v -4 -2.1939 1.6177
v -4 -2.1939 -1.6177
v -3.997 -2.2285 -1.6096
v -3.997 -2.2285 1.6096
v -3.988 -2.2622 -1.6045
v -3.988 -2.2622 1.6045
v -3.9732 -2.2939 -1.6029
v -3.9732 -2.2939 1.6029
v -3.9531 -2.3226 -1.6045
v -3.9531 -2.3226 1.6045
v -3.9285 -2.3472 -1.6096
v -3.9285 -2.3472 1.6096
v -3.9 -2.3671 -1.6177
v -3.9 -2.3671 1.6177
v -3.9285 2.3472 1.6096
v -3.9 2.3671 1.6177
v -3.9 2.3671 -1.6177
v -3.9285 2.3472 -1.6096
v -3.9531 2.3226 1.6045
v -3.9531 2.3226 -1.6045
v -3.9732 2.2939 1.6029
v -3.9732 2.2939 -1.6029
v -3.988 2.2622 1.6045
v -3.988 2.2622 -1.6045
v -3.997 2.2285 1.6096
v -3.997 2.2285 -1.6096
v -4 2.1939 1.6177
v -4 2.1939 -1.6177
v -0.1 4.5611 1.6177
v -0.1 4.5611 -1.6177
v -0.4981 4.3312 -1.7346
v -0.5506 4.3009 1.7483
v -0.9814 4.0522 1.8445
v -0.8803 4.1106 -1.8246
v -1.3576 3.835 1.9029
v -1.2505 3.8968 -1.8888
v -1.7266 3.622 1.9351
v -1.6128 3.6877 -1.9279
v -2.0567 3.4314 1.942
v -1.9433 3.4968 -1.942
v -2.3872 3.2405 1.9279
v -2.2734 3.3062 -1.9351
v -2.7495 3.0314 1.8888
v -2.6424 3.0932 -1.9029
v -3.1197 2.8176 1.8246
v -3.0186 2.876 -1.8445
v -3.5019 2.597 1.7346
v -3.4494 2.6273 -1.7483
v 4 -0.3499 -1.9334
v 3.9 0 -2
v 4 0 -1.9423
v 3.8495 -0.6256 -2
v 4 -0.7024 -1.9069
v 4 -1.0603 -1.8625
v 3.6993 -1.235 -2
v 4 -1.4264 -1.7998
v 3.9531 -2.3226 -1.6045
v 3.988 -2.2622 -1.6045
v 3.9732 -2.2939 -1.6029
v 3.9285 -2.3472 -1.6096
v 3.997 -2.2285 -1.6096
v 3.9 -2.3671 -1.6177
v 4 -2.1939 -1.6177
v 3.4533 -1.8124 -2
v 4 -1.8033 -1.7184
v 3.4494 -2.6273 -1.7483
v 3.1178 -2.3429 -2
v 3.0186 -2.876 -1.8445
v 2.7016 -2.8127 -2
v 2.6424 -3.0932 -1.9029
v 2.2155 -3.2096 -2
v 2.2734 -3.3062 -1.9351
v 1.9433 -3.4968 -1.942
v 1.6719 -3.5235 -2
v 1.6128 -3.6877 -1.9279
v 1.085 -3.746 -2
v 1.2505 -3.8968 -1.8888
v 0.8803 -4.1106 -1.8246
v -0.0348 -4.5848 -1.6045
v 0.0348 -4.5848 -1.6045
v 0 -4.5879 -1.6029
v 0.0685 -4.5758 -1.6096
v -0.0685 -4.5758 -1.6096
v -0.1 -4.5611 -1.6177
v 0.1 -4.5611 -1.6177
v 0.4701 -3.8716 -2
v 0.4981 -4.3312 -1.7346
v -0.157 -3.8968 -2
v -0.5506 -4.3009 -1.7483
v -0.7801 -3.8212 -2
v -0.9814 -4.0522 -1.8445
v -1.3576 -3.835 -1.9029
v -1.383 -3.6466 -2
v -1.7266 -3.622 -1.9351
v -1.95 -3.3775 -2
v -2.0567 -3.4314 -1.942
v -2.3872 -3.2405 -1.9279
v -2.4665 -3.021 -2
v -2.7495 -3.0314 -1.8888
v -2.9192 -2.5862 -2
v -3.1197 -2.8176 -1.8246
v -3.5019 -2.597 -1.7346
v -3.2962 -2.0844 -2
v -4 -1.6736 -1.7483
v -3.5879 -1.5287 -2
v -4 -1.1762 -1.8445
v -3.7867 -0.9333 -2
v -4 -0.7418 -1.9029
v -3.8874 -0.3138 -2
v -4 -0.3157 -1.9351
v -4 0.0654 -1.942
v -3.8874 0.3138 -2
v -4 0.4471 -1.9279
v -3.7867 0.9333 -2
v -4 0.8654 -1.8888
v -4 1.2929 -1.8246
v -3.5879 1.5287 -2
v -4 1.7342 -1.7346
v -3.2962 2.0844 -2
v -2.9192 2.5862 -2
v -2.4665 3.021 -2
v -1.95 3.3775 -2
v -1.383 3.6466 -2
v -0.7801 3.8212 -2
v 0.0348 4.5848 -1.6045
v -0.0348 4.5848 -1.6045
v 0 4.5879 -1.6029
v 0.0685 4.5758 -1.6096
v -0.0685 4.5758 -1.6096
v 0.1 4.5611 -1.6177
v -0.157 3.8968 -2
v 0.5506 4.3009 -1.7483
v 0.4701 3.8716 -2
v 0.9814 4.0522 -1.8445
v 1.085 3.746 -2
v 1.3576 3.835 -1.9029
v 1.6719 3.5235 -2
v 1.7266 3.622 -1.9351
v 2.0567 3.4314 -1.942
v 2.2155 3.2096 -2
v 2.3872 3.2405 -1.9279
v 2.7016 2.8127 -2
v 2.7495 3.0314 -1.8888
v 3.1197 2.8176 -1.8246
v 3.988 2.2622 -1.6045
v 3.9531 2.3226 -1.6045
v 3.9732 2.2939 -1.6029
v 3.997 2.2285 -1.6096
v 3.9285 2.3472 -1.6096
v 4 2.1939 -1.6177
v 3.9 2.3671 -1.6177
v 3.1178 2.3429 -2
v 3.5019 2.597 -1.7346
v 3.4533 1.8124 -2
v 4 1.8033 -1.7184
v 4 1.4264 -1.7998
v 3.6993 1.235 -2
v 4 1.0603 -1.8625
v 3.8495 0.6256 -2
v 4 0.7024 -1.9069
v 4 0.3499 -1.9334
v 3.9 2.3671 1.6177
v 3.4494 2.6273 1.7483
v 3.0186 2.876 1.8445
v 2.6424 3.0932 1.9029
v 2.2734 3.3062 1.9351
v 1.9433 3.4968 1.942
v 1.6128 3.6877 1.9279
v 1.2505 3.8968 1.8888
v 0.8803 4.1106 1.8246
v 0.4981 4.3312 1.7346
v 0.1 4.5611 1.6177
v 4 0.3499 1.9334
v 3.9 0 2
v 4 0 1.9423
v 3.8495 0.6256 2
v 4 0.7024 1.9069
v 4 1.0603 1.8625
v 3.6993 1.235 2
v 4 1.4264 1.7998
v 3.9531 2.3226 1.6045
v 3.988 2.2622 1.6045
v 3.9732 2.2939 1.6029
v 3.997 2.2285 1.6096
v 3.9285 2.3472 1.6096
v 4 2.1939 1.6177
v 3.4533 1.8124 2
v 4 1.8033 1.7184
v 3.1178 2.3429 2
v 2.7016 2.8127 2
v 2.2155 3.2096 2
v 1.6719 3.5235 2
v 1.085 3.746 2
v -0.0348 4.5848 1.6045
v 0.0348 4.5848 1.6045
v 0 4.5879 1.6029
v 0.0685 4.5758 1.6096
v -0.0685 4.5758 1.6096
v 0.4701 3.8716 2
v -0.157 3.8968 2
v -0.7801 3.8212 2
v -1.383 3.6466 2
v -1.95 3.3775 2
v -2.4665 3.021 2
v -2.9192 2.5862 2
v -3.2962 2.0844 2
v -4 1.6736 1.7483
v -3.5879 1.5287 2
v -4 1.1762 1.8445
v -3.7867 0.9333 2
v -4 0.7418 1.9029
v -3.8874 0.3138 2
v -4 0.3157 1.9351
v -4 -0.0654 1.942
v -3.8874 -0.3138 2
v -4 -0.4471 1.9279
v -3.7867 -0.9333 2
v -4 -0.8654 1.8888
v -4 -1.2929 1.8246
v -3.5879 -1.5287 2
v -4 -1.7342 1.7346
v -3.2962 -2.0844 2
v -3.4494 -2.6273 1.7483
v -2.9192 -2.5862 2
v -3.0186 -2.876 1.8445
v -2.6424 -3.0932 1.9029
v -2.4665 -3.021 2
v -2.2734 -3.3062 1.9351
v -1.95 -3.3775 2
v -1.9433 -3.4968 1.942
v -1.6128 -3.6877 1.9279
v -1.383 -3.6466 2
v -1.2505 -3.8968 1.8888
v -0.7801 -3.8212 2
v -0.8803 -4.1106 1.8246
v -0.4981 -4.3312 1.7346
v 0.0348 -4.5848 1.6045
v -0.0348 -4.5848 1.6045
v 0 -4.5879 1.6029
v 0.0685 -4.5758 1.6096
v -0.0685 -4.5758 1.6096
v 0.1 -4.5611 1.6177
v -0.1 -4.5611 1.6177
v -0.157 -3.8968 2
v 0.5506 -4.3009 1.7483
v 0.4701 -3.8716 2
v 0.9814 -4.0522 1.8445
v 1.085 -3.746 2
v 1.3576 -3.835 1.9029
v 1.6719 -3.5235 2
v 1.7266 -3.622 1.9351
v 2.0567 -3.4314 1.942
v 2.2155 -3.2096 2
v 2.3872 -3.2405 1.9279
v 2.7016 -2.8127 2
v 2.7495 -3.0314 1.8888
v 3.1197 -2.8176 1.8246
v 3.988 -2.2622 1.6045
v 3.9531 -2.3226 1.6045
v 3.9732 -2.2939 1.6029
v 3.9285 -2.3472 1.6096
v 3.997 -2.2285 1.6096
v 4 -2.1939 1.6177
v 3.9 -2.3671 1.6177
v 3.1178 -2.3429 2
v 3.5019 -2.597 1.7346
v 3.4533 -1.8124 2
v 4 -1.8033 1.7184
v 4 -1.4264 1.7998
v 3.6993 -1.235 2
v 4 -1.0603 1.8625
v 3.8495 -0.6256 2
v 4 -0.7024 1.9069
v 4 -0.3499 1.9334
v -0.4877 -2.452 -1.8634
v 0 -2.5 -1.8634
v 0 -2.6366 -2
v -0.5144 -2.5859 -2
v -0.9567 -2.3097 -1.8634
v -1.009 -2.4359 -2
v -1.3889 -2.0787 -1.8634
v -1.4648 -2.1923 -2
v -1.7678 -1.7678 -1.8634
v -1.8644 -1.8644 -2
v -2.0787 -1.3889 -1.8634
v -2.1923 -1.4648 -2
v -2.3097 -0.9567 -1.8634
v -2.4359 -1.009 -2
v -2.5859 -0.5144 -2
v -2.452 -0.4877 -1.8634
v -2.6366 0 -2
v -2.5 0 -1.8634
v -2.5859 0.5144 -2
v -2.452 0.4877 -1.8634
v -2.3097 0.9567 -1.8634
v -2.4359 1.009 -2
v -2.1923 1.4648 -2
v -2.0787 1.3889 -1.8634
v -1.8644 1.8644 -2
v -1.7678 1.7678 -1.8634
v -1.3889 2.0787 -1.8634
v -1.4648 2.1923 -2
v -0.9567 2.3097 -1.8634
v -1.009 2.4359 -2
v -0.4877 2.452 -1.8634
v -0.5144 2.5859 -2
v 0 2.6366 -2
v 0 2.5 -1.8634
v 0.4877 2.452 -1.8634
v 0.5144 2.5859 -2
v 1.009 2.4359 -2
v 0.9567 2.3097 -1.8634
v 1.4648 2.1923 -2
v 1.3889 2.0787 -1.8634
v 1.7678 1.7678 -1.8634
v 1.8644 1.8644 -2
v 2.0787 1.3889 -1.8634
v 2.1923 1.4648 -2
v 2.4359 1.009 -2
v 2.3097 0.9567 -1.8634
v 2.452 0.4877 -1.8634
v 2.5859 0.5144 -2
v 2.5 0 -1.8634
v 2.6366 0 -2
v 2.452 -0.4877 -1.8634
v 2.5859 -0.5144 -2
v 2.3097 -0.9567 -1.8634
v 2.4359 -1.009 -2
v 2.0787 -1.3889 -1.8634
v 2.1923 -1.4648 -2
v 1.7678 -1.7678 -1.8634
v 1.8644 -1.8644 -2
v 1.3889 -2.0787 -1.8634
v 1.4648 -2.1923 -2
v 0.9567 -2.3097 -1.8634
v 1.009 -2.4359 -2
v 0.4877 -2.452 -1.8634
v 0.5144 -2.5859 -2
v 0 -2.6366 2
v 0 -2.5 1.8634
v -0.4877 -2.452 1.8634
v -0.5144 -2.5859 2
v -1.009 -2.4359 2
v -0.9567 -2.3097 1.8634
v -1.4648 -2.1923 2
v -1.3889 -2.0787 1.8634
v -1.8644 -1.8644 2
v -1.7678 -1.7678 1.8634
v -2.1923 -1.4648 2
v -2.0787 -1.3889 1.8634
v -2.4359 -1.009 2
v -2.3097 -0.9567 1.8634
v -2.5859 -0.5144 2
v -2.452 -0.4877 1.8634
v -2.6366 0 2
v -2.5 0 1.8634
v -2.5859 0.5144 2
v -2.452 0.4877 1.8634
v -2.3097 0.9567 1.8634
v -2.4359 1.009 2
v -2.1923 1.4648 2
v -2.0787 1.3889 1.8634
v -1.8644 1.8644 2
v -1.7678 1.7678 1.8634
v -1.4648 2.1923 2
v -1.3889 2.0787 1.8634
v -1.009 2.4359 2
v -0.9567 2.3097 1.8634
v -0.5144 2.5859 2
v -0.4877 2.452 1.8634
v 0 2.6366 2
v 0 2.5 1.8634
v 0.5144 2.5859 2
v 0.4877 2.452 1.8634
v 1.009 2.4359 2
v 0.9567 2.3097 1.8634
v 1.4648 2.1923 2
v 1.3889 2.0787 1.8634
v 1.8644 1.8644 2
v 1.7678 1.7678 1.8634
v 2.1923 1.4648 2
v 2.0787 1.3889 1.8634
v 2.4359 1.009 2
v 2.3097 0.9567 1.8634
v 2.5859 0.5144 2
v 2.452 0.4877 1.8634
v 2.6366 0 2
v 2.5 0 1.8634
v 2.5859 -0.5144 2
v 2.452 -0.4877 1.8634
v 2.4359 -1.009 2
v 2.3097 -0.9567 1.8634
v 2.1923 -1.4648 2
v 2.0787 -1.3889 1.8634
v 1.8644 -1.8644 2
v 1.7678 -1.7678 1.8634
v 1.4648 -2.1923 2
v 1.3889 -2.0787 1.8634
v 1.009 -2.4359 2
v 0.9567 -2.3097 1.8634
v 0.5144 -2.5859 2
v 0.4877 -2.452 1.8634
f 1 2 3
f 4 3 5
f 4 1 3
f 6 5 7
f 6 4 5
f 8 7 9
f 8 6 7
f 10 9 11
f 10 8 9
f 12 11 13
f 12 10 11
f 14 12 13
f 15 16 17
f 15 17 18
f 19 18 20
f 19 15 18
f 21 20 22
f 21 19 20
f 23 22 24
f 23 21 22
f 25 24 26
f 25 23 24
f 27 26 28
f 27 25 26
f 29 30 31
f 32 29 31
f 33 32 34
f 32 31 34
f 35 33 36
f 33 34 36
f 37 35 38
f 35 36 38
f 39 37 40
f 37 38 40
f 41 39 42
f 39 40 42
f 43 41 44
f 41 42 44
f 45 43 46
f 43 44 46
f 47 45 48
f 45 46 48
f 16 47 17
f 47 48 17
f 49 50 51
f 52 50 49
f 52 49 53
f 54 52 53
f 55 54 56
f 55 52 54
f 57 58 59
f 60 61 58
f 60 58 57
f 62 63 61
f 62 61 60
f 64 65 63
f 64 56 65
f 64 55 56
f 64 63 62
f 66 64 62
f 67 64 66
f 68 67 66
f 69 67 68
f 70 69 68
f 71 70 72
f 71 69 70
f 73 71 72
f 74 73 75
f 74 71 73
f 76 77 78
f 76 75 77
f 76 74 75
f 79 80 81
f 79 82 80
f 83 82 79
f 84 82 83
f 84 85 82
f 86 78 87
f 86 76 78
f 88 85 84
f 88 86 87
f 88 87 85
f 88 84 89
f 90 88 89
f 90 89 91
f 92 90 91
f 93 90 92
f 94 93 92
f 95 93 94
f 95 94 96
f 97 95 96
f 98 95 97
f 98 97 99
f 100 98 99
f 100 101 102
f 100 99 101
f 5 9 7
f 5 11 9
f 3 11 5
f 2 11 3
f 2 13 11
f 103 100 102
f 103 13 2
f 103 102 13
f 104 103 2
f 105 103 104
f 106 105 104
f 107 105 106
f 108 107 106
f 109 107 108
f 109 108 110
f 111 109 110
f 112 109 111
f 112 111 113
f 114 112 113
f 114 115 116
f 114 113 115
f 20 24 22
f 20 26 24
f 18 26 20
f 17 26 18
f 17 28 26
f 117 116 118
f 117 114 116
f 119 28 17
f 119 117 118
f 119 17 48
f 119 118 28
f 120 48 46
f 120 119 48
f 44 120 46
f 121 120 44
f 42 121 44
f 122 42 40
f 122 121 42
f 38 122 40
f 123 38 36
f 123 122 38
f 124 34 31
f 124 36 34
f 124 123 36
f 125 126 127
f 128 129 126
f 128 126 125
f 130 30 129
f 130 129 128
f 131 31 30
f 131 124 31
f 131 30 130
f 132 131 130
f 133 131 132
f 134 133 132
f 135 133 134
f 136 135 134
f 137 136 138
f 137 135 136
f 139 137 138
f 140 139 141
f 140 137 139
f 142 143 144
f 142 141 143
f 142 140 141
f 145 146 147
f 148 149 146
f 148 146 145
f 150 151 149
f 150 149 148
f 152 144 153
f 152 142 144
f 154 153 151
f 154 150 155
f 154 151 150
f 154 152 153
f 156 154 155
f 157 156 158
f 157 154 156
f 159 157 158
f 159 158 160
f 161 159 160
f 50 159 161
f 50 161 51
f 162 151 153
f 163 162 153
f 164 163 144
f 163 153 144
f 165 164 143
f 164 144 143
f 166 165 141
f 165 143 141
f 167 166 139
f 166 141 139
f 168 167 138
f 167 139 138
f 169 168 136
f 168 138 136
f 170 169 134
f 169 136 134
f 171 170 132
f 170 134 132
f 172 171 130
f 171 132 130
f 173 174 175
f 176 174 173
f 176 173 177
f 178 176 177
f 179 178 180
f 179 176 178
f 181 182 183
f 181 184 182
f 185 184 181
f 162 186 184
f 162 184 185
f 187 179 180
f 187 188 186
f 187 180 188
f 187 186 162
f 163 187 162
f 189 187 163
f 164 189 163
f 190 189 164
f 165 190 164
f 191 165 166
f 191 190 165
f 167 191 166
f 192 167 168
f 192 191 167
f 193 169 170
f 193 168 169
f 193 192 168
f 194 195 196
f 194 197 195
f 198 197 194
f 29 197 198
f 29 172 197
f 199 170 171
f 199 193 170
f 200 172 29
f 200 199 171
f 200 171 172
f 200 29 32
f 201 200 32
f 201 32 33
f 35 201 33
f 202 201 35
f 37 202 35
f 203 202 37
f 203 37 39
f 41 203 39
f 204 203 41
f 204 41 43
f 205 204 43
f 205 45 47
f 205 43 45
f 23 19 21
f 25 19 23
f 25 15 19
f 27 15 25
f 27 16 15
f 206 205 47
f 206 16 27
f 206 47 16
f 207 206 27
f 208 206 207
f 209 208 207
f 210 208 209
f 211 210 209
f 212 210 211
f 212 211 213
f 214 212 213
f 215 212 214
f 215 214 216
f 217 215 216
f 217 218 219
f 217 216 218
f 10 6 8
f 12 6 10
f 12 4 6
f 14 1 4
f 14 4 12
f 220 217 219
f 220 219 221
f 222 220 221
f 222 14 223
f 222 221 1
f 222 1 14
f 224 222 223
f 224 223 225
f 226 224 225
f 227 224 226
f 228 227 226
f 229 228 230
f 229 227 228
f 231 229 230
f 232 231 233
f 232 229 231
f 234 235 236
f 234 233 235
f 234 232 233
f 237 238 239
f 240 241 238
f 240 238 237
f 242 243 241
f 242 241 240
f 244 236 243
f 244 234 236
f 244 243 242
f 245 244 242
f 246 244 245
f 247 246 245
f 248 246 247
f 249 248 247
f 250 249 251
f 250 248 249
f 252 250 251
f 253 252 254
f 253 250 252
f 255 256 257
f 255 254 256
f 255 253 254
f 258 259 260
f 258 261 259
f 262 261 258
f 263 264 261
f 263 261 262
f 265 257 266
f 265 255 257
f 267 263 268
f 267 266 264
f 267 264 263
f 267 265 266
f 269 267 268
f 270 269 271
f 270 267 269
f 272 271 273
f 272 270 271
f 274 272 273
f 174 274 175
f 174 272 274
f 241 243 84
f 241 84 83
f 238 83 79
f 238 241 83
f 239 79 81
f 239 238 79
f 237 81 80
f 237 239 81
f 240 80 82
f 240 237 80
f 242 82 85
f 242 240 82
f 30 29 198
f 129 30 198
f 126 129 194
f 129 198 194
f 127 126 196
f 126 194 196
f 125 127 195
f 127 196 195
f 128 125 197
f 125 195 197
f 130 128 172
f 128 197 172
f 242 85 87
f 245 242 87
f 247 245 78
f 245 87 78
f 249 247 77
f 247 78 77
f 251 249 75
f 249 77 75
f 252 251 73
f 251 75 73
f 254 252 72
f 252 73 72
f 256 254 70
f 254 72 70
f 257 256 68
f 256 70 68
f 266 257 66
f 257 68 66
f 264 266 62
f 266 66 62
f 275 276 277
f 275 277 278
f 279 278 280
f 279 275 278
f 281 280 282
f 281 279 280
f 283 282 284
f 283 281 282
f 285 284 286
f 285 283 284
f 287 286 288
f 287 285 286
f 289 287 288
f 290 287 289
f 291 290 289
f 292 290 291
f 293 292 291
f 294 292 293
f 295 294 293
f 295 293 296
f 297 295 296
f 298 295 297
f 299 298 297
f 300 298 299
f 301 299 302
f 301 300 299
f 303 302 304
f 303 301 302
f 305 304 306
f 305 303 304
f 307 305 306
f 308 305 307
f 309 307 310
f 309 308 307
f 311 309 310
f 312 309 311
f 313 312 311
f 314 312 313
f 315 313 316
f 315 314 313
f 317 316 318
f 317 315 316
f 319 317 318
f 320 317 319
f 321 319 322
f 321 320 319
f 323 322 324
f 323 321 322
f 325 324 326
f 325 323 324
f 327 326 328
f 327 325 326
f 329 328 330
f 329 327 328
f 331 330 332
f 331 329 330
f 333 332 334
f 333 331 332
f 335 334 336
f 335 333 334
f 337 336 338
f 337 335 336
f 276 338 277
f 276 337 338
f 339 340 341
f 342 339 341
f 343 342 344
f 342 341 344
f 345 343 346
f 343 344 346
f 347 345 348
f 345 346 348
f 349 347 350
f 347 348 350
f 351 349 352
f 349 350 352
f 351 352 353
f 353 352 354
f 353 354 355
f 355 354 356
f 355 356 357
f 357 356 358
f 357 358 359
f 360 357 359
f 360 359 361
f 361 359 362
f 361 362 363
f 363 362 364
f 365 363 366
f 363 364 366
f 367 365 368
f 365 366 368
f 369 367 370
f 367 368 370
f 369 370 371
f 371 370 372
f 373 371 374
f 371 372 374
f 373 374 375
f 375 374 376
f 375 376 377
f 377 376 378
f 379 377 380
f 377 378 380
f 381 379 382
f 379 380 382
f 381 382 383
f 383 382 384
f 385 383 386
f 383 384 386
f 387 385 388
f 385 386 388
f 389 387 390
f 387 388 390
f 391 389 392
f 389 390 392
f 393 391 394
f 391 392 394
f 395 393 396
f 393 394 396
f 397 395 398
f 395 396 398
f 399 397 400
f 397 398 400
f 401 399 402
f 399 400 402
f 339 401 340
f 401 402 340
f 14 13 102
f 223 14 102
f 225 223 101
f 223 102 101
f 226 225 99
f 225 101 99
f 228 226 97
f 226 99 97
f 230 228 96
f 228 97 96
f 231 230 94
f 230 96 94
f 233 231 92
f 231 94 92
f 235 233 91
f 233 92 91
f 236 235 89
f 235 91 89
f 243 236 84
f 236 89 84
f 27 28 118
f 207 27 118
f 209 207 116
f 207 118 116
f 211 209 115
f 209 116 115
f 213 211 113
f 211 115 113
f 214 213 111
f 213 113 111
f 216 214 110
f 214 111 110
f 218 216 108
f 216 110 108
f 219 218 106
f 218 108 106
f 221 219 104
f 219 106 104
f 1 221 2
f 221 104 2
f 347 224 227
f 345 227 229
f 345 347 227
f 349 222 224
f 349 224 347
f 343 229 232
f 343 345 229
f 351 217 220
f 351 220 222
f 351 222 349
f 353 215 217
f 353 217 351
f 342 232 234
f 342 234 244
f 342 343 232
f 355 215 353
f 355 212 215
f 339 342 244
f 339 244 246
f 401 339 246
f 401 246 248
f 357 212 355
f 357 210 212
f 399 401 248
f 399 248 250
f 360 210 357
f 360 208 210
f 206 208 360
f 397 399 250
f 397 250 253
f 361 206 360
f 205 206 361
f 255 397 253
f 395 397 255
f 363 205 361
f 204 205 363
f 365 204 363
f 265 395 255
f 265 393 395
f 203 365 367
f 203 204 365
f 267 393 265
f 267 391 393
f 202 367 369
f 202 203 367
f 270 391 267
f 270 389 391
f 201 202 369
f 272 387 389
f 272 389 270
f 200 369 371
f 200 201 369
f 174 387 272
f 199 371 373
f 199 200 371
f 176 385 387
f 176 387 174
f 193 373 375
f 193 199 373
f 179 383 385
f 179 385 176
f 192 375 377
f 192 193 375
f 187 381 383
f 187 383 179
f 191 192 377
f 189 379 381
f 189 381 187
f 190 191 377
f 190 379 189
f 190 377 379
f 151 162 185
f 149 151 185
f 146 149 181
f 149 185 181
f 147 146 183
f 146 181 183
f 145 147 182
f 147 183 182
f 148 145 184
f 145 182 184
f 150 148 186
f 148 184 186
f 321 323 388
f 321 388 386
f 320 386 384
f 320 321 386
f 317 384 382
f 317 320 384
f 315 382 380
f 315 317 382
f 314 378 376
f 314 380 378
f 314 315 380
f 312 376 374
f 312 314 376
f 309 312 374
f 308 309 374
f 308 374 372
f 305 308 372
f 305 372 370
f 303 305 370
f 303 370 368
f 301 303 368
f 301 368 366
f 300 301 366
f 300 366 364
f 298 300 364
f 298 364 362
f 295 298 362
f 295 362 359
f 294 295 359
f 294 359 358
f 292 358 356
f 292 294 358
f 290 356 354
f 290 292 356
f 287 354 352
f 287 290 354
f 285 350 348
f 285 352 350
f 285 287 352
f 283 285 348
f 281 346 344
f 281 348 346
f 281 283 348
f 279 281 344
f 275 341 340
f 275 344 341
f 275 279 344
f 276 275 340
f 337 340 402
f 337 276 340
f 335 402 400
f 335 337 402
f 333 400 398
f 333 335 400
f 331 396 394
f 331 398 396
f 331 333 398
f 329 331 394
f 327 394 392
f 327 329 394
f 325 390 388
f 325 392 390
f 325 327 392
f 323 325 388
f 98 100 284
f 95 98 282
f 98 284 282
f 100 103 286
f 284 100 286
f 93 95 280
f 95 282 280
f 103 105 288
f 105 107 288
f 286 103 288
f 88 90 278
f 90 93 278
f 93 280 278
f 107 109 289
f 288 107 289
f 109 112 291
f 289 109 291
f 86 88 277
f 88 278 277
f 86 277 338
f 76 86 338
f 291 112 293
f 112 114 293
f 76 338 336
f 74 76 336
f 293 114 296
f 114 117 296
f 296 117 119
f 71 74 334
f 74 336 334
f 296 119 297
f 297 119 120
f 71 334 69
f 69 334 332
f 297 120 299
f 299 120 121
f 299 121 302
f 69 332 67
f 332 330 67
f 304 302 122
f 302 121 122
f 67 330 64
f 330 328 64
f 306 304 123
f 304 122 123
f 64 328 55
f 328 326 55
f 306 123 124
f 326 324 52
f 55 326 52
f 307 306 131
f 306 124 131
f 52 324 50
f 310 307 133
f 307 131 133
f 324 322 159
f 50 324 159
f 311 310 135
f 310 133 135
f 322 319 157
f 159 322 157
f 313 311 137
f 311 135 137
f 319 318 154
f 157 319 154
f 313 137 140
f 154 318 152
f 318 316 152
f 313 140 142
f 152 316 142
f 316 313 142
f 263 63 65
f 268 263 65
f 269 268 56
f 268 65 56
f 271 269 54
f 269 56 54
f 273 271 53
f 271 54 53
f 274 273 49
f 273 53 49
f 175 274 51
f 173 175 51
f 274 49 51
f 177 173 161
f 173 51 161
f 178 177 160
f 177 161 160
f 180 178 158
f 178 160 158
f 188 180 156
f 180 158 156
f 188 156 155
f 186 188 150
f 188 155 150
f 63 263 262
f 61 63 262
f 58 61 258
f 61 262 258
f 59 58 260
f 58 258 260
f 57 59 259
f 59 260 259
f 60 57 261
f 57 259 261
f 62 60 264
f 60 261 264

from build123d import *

# Parameters (mm, degrees)
BOSS_EXTRUDE1_DEPTH      = 2
BOSS_EXTRUDE1_DEPTH_BACK = 2
SKETCH2_R                = 2.5
SKETCH3_OUTSIDE_W        = 41.334
SKETCH3_OUTSIDE_H        = 42.572
SKETCH3_OUTSIDE_R        = 3.9
CUT_EXTRUDE1_DEPTH       = 8.302967433
CUT_EXTRUDE1_DRAFT       = -60
FILLET1_R                = 0.2
MIRROR1_COPY_1_SKETCH_W  = 41.334
MIRROR1_COPY_1_SKETCH_H  = 42.572
MIRROR1_COPY_1_SKETCH_R  = 3.9
MIRROR1_COPY_1_DEPTH     = 8.302967433
MIRROR1_COPY_1_DRAFT     = -60


with BuildPart() as part:
    # Sketch2 → Boss-Extrude1 (new, two sides: drawn at the far end of the back side and taken through both)
    with BuildSketch(Plane.XY.offset(-BOSS_EXTRUDE1_DEPTH_BACK)):
        Polygon((0, 4.618802154), (-4, 2.309401077), (-4, -2.309401077), (0, -4.618802154), (4, -2.309401077), (4, 2.309401077), align=None)
        Circle(SKETCH2_R, mode=Mode.SUBTRACT)
    extrude(amount=BOSS_EXTRUDE1_DEPTH + BOSS_EXTRUDE1_DEPTH_BACK)


with BuildPart() as cut_extrude1_tool:
    # Sketch3 outside → Cut-Extrude1 (with draft: the straight prism first)
    with BuildSketch(Plane.XY.offset(2)):
        Rectangle(SKETCH3_OUTSIDE_W, SKETCH3_OUTSIDE_H)
        Circle(SKETCH3_OUTSIDE_R, mode=Mode.SUBTRACT)
    extrude(amount=-CUT_EXTRUDE1_DEPTH)
    # Cut-Extrude1: the draft: its side faces are tilted about the plane it starts from
    cut_extrude1_sides = [cut_extrude1_tool.faces().sort_by_distance(p)[0] for p in [
        (0, -21.286, -2.151483717),
        (20.667, 0, -2.151483717),
        (0, 21.286, -2.151483717),
        (-20.667, 0, -2.151483717),
        (-3.9, 0, -2.151483717),
    ]]
    draft(cut_extrude1_sides, Plane.XY.offset(2), CUT_EXTRUDE1_DRAFT)


with BuildPart() as part_1:
    add(part.part)

    # Cut-Extrude1: cut by cut_extrude1_tool
    add(cut_extrude1_tool.part, mode=Mode.SUBTRACT)

    # Fillet1
    fillet1_edges = [part_1.edges().sort_by_distance(p)[0] for p in [
        (4, -2.309401077, -0.207500308),
        (0, -4.618802154, -0.207500308),
        (-4, -2.309401077, -0.207500308),
        (-4, 2.309401077, -0.207500308),
        (4, 2.309401077, -0.207500308),
        (0, 4.618802154, -0.207500308),
    ]]
    fillet(fillet1_edges, radius=FILLET1_R)

    # Cut-Extrude4 cone 1 section (through the dimple's axis) → Cut-Extrude4 (revolve, cut)
    with BuildSketch(Plane(origin=(0, 0, 2), x_dir=(0, -1, 0), z_dir=(1, 0, 0))):
        Polygon((0, 0), (2.63660254, 0), (0, 2.63660254), align=None)
    cut_extrude4 = revolve(axis=Axis((0, 0, 2), (0, 0, -1)), mode=Mode.SUBTRACT)

    # Mirror1: Cut-Extrude4 across plane
    add(cut_extrude4.mirror(Plane.XY), mode=Mode.SUBTRACT)


with BuildPart() as mirror1_copy_1_tool:
    # Mirror1 copy 1 sketch → Mirror1 copy 1 (with draft: the straight prism first)
    with BuildSketch(Plane(origin=(0, 0, -2), x_dir=(1, 0, 0), z_dir=(0, 0, -1))):
        Rectangle(MIRROR1_COPY_1_SKETCH_W, MIRROR1_COPY_1_SKETCH_H)
        Circle(MIRROR1_COPY_1_SKETCH_R, mode=Mode.SUBTRACT)
    extrude(amount=-MIRROR1_COPY_1_DEPTH)
    # Mirror1 copy 1: the draft: its side faces are tilted about the plane it starts from
    mirror1_copy_1_sides = [mirror1_copy_1_tool.faces().sort_by_distance(p)[0] for p in [
        (0, -21.286, 2.151483717),
        (20.667, 0, 2.151483717),
        (0, 21.286, 2.151483717),
        (-20.667, 0, 2.151483717),
        (-3.9, 0, 2.151483717),
    ]]
    draft(mirror1_copy_1_sides, Plane(origin=(0, 0, -2), x_dir=(1, 0, 0), z_dir=(0, 0, -1)), MIRROR1_COPY_1_DRAFT)


with BuildPart() as part_2:
    add(part_1.part)

    # Mirror1 copy 1: cut by mirror1_copy_1_tool
    add(mirror1_copy_1_tool.part, mode=Mode.SUBTRACT)


solid = part_2.part
